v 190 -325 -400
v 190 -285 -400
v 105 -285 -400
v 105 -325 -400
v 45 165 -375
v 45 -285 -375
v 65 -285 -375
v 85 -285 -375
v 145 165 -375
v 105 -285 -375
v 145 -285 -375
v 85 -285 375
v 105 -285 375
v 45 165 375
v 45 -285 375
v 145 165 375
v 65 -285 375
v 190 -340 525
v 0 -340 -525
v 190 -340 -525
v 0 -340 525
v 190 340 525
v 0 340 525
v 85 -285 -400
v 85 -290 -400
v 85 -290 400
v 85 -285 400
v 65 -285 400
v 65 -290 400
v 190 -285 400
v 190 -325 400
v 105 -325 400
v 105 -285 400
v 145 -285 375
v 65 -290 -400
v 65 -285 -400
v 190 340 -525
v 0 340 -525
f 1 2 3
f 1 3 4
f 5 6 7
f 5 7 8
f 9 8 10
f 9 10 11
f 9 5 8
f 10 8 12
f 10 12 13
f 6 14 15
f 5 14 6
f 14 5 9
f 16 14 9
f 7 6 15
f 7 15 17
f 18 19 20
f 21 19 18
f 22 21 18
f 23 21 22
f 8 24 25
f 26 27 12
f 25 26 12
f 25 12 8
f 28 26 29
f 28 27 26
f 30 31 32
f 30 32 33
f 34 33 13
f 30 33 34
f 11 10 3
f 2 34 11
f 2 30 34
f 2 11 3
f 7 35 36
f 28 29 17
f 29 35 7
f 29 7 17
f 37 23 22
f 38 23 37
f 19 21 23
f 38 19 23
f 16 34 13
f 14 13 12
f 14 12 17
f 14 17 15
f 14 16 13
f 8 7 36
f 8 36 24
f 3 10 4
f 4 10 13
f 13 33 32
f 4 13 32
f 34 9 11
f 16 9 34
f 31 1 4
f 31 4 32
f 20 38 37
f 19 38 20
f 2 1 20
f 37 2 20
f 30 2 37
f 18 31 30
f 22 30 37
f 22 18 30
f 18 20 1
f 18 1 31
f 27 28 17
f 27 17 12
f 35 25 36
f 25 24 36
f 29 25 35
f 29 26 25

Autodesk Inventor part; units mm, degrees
sketch "草图1" plane through (0, 0, 0) normal (1, 0, 0) x (0, 1, 0)
  line L0 (340, -525) -> (-340, -525)
  line L1 (-340, -525) -> (-340, 525)
  line L2 (-340, 525) -> (340, 525)
  line L3 (340, 525) -> (340, -525)
  line L4 (340, -525) -> (-340, 525) construction
  line L5 (-340, -525) -> (340, 525) construction
  point P0 (0, 0)
  dimension "d0" = 680
  dimension "d1" = 1050
extrude "拉伸1" add sketch "草图1" along normal blind 190
fillet "圆角1" [suppressed]
sketch "草图2" plane through (190, 0, 0) normal (1, 0, 0) x (0, 0, -1)
  line L0 (475, -290) -> (-475, -290) projected
  line L1 (475, 290) -> (475, -290) projected
  line L2 (-475, 290) -> (475, 290) projected
  line L3 (-475, -290) -> (-475, 290) projected
  line L4 (-475, 290) -> (475, 290)
  line L5 (475, 290) -> (475, 190)
  line L6 (475, 190) -> (-475, 190)
  line L7 (-475, 190) -> (-475, 290)
  point P0 (0, 0)
  dimension "d5" = 100
extrude "拉伸2" [suppressed]
sketch "草图3" plane through (190, 0, 0) normal (1, 0, 0) x (0, 0, -1)
  line L0 (-475, -290) -> (-475, 290) projected
  line L1 (475, -290) -> (-475, -290) projected
  line L2 (475, 290) -> (475, -290) projected
  line L3 (-525, -340) -> (525, -340) projected
  line L4 (-525, 340) -> (-525, -340) projected
  line L5 (525, -340) -> (525, 340) projected
  line L6 (-475, -241.0052) -> (375, -241.0052)
  line L7 (375, -241.0052) -> (375, -341.0052)
  line L8 (375, -341.0052) -> (-475, -341.0052)
  line L9 (-475, -341.0052) -> (-475, -241.0052)
  point P0 (0, 0)
  point P1 (425, -191.0052)
  point P2 (425, -240)
  dimension "d8" = 850
  dimension "d9" = 100
extrude "拉伸3" [suppressed]
sketch "草图4" plane through (190, -191.0052, -425) normal (0, -1, 0) x (1, 0, 0)
  line L0 (-27.3454, 1.363) -> (-107.3454, 1.363)
  line L1 (-107.3454, 1.363) -> (-107.3454, 851.363)
  line L2 (-107.3454, 851.363) -> (-27.3454, 851.363)
  line L3 (-27.3454, 851.363) -> (-27.3454, 1.363)
  point P0 (-190, 425)
  dimension "d12" = 80
  dimension "d13" = 850
extrude "拉伸4" [suppressed]
sketch "草图5" plane through (190, 0, 0) normal (1, 0, 0) x (0, 0, -1)
  line L0 (475, -290) -> (-475, -290) projected
  line L1 (475, 290) -> (475, -290) projected
  line L2 (-475, 290) -> (475, 290) projected
  line L3 (-475, -290) -> (-475, 290) projected
  line L4 (-400, -285) -> (400, -285)
  line L5 (400, -285) -> (400, -325)
  line L6 (400, -325) -> (-400, -325)
  line L7 (-400, -325) -> (-400, -285)
  line L8 (-525, -340) -> (525, -340) projected
  point P0 (0, 0)
  point P1 (-400, -305)
  point P2 (-400, -290)
  point P3 (400, -290)
  dimension "d16" = 800
  dimension "d17" = 40
  dimension "d19" = 75
  dimension "d34" = 55
extrude "拉伸5" cut sketch "草图5" against normal blind 105 contours L5 L6 L7 L0 | L0 L7 L4 L5
ref_plane "工作平面1" through (0, 165, 525) normal (0, 1, 0) x (1, 0, 0)
sketch "草图6" plane through (0, 165, 525) normal (0, 1, 0) x (1, 0, 0)
  line L0 (190, 50) -> (190, 1000) projected
  arc A0 (190, 1000) -> (140, 1050) centre (140, 1000) ccw projected
  line L1 (140, 1050) -> (140, 0) projected
  arc A1 (140, 0) -> (190, 50) centre (140, 50) ccw projected
  line L2 (0, 1050) -> (190, 1050) projected
  line L3 (0, 1050) -> (0, 0) projected
  line L4 (0, 0) -> (190, 0) projected
  line L5 (145, 150) -> (45, 150)
  line L6 (45, 150) -> (45, 900)
  line L7 (45, 900) -> (145, 900)
  line L8 (145, 900) -> (145, 150)
  line L9 (190, 1050) -> (190, 0) projected
  point P0 (0, 525)
  dimension "d23" = 100
  dimension "d24" = 750
  dimension "d25" = 150
  dimension "d26" = 45
extrude "拉伸6" cut sketch "草图6" against normal blind 450 contours L5 L6 L7 L1 | L1 L7 L8 L5
fillet "圆角3" [suppressed]
ref_plane "工作平面2" through (0, -340, 225) normal (0, 0, 1) x (1, 0, 0)
sketch "草图7" plane through (0, -340, 225) normal (0, 0, 1) x (1, 0, 0)
  point P0 (0, 340)
sketch "草图8" plane through (0, -340, 225) normal (0, 0, 1) x (1, 0, 0)
  line L0 (-8.4267, 713.5838) -> (252.801, 713.5838)
  line L1 (252.801, 713.5838) -> (252.801, -46.692)
  line L2 (252.801, -46.692) -> (-8.4267, -46.692)
  line L3 (-8.4267, -46.692) -> (-8.4267, 713.5838)
  point P0 (0, 340)
extrude "拉伸7" [suppressed]
sketch "草图9" plane through (190, -285, -400) normal (0, -1, 0) x (1, 0, 0)
  line L0 (0, 800) -> (-105, 800) projected
  line L1 (0, 0) -> (-105, 0) projected
  line L2 (-105, 0) -> (-105, 800) projected
  arc A0 (0, 875) -> (-50, 925) centre (-50, 875) ccw projected
  line L3 (0, 875) -> (-190, 875)
  line L4 (-190, -125) -> (-190, 925) projected
  arc A1 (-50, -125) -> (0, -75) centre (-50, -75) ccw projected
  line L5 (0, -75) -> (-190, -75)
  line L6 (-95, 875) -> (-95, -75)
  line L7 (-25, 800) -> (-65, 800)
  line L8 (-65, 800) -> (-65, 0)
  line L9 (-65, 0) -> (-25, 0)
  line L10 (-25, 0) -> (-25, 800)
  line L11 (-185, 800) -> (-145, 800)
  line L12 (-145, 800) -> (-145, 0)
  line L13 (-145, 0) -> (-185, 0)
  line L14 (-185, 0) -> (-185, 800)
  point P0 (-190, 400)
  point P1 (-14.2929, 800)
  point P2 (-14.2929, 0)
  point P3 (-25, 0)
  point P4 (-65, 800)
  dimension "d35" = 40
  dimension "d36" = 30
extrude "拉伸8" [suppressed]
ref_plane "工作平面3" through (125, 0, 0) normal (1, 0, 0) x (0, 0, -1)
sketch "草图10" plane through (125, 0, 0) normal (1, 0, 0) x (0, 0, -1)
  line L0 (400, -280) -> (-400, -280) projected
  line L1 (-400, -280) -> (-400, 220) projected
  line L2 (-400, 220) -> (400, 220) projected
  line L3 (400, -280) -> (400, 220) projected
  line L4 (-400, 220) -> (400, 220)
  line L5 (400, 220) -> (400, 160)
  line L6 (400, 160) -> (-400, 160)
  line L7 (-400, 160) -> (-400, 220)
  point P0 (0, 0)
  point P1 (-400, 160)
  point P2 (400, 160)
  dimension "d40" = 800
  dimension "d41" = 60
extrude "拉伸9" [suppressed]
fillet "圆角4" [suppressed]
ref_plane "工作平面4" through (190, -290, -400) normal (0, -1, 0) x (1, 0, 0)
ref_plane "工作平面5" through (95, 0, 0) normal (1, 0, 0) x (0, 0, -1)
ref_plane "工作平面6" through (190, -290, 350) normal (0, 0, -1) x (-1, 0, 0)
sketch "草图11" plane through (0, -340, -525) normal (0, 0, -1) x (-1, 0, 0)
  point P0 (0, 340)
ref_plane "工作平面7" through (0, -340, 225) normal (0, 0, 1) x (1, 0, 0)
sketch "草图12" plane through (0, -340, 225) normal (0, 0, 1) x (1, 0, 0)
  line L0 (145, 505) -> (45, 505) projected
  line L1 (145, 55) -> (85, 55) projected
  line L2 (145, 505) -> (145, 55) projected
  line L3 (145, 505) -> (45, 505) projected
  line L4 (45, 505) -> (45, 55) projected
  line L5 (45, 55) -> (85, 55) projected
  line L6 (190, 55) -> (190, 15) projected
  line L7 (190, 55) -> (85, 55) projected
  line L8 (85, 55) -> (85, 15) projected
  line L9 (190, 15) -> (85, 15) projected
  line L10 (0, 0) -> (190, 0) projected
  line L11 (0, 0) -> (0, 680) projected
  line L12 (0, 680) -> (190, 680) projected
  line L13 (190, 0) -> (190, 680) projected
  point P0 (0, 340)
sketch "草图13" plane through (0, -340, -525) normal (0, 0, -1) x (-1, 0, 0)
  line L0 (-45, 505) -> (-45, 55) projected
  line L1 (-45, 55) -> (-85, 55) projected
  line L2 (-85, 55) -> (-85, 15) projected
  line L3 (-85, 55) -> (-65, 55)
  line L4 (-65, 55) -> (-65, 15)
  line L5 (-65, 15) -> (-85, 15)
  line L6 (-85, 15) -> (-85, 55)
  point P0 (0, 340)
  point P1 (-65, 35)
  dimension "d49" = 20
  dimension "d50" = 40
  dimension "d51" = 20
extrude "拉伸10" [suppressed]
sketch "草图14" plane through (190, -325, 400) normal (0, 0, -1) x (-1, 0, 0)
  line L0 (145, 490) -> (45, 490) projected
  line L1 (45, 490) -> (45, 40) projected
  line L2 (105, 40) -> (45, 40) projected
  line L3 (105, 40) -> (145, 40) projected
  line L4 (145, 490) -> (145, 40) projected
  line L5 (0, 40) -> (0, 0) projected
  line L6 (0, 40) -> (105, 40) projected
  line L7 (105, 40) -> (105, 0) projected
  line L8 (0, 0) -> (105, 0) projected
  line L9 (105, 40) -> (85, 40)
  line L10 (85, 40) -> (85, 0)
  line L11 (85, 0) -> (105, 0)
  line L12 (105, 0) -> (105, 40)
  line L13 (45, 40) -> (65, 40)
  line L14 (65, 40) -> (65, 20)
  line L15 (65, 20) -> (45, 20)
  line L16 (45, 20) -> (45, 40)
  line L17 (145, 40) -> (105, 40) projected
  line L18 (105, 40) -> (125, 40)
  line L19 (125, 40) -> (125, 35)
  line L20 (125, 35) -> (105, 35)
  line L21 (105, 35) -> (105, 40)
  point P0 (190, 325)
  point P1 (85, 40)
  dimension "d54" = 20
  dimension "d55" = 40
  dimension "d56" = 20
  dimension "d57" = 20
  dimension "d67" = 20
  dimension "d68" = 5
extrude "拉伸11" add sketch "草图14" along normal blind 800 contours L2 L14 L15 L16 | L7 L8 L10 L2
sketch "草图15" plane through (190, -325, 400) normal (0, 0, -1) x (-1, 0, 0)
  line L0 (0, 40) -> (45, 40) projected
  line L1 (45, 40) -> (0, 40)
  line L2 (0, 40) -> (0, 35)
  line L3 (0, 35) -> (45, 35)
  line L4 (45, 35) -> (45, 40)
  point P0 (190, 325)
  dimension "d60" = 45
  dimension "d61" = 5
extrude "拉伸12" [suppressed]
sketch "草图16" plane through (190, -325, 400) normal (0, 1, 0) x (1, 0, 0)
  line L0 (-105, 800) -> (-105, 0) projected
  line L1 (0, 800) -> (0, 0) projected
  line L2 (-105, 0) -> (0, 0)
  line L3 (0, 0) -> (0, 800)
  line L4 (0, 800) -> (-105, 800)
  line L5 (-105, 800) -> (-105, 0)
  point P0 (-190, 400)
extrude "拉伸13" [suppressed]
fillet "圆角5" [suppressed]
sketch "草图17" plane through (190, -325, 400) normal (0, 0, -1) x (-1, 0, 0)
  line L0 (145, 40) -> (85, 40) projected
  line L1 (125, 40) -> (105, 40)
  line L2 (105, 40) -> (105, 35)
  line L3 (105, 35) -> (125, 35)
  line L4 (125, 35) -> (125, 40)
  line L5 (145, 490) -> (145, 40) projected
  point P0 (190, 325)
  point P1 (125, 37.5)
  point P2 (105, 40)
  dimension "d69" = 20
  dimension "d70" = 5
  dimension "d71" = 20
extrude "拉伸14" cut sketch "草图17" along normal blind 800
ref_plane "工作平面8" through (0, -340, 225) normal (0, 0, 1) x (1, 0, 0)
sketch "草图18" plane through (0, -340, 225) normal (0, 0, 1) x (1, 0, 0)
  line L0 (-8.4988, 711.8216) -> (199.7213, 711.8216)
  line L1 (199.7213, 711.8216) -> (199.7213, -36.0709)
  line L2 (199.7213, -36.0709) -> (-8.4988, -36.0709)
  line L3 (-8.4988, -36.0709) -> (-8.4988, 711.8216)
  point P0 (0, 340)
extrude "拉伸15" [suppressed]
sketch "草图19" plane through (145, -305, 400) normal (1, 0, 0) x (0, 0, -1)
  line L0 (0, 20) -> (25, 20) projected
  line L1 (0, 0) -> (800, 0) projected
  line L2 (0, 20) -> (800, 20)
  line L3 (800, 20) -> (800, 0)
  line L4 (800, 0) -> (0, 0)
  line L5 (0, 0) -> (0, 20)
  point P0 (400, 305)
extrude "拉伸16" [suppressed]
sketch "草图20" plane through (190, -325, 400) normal (0, 0, -1) x (-1, 0, 0)
  line L0 (65, 40) -> (85, 40) projected
  line L1 (65, 20) -> (45, 20) projected
  line L2 (65, 40) -> (45, 40)
  line L3 (45, 40) -> (45, 20)
  line L4 (45, 20) -> (65, 20)
  line L5 (65, 20) -> (65, 40)
  point P0 (190, 325)
extrude "拉伸17" cut sketch "草图20" along normal blind 800
properties part number "heater" material "聚碳酸酯，透明"
